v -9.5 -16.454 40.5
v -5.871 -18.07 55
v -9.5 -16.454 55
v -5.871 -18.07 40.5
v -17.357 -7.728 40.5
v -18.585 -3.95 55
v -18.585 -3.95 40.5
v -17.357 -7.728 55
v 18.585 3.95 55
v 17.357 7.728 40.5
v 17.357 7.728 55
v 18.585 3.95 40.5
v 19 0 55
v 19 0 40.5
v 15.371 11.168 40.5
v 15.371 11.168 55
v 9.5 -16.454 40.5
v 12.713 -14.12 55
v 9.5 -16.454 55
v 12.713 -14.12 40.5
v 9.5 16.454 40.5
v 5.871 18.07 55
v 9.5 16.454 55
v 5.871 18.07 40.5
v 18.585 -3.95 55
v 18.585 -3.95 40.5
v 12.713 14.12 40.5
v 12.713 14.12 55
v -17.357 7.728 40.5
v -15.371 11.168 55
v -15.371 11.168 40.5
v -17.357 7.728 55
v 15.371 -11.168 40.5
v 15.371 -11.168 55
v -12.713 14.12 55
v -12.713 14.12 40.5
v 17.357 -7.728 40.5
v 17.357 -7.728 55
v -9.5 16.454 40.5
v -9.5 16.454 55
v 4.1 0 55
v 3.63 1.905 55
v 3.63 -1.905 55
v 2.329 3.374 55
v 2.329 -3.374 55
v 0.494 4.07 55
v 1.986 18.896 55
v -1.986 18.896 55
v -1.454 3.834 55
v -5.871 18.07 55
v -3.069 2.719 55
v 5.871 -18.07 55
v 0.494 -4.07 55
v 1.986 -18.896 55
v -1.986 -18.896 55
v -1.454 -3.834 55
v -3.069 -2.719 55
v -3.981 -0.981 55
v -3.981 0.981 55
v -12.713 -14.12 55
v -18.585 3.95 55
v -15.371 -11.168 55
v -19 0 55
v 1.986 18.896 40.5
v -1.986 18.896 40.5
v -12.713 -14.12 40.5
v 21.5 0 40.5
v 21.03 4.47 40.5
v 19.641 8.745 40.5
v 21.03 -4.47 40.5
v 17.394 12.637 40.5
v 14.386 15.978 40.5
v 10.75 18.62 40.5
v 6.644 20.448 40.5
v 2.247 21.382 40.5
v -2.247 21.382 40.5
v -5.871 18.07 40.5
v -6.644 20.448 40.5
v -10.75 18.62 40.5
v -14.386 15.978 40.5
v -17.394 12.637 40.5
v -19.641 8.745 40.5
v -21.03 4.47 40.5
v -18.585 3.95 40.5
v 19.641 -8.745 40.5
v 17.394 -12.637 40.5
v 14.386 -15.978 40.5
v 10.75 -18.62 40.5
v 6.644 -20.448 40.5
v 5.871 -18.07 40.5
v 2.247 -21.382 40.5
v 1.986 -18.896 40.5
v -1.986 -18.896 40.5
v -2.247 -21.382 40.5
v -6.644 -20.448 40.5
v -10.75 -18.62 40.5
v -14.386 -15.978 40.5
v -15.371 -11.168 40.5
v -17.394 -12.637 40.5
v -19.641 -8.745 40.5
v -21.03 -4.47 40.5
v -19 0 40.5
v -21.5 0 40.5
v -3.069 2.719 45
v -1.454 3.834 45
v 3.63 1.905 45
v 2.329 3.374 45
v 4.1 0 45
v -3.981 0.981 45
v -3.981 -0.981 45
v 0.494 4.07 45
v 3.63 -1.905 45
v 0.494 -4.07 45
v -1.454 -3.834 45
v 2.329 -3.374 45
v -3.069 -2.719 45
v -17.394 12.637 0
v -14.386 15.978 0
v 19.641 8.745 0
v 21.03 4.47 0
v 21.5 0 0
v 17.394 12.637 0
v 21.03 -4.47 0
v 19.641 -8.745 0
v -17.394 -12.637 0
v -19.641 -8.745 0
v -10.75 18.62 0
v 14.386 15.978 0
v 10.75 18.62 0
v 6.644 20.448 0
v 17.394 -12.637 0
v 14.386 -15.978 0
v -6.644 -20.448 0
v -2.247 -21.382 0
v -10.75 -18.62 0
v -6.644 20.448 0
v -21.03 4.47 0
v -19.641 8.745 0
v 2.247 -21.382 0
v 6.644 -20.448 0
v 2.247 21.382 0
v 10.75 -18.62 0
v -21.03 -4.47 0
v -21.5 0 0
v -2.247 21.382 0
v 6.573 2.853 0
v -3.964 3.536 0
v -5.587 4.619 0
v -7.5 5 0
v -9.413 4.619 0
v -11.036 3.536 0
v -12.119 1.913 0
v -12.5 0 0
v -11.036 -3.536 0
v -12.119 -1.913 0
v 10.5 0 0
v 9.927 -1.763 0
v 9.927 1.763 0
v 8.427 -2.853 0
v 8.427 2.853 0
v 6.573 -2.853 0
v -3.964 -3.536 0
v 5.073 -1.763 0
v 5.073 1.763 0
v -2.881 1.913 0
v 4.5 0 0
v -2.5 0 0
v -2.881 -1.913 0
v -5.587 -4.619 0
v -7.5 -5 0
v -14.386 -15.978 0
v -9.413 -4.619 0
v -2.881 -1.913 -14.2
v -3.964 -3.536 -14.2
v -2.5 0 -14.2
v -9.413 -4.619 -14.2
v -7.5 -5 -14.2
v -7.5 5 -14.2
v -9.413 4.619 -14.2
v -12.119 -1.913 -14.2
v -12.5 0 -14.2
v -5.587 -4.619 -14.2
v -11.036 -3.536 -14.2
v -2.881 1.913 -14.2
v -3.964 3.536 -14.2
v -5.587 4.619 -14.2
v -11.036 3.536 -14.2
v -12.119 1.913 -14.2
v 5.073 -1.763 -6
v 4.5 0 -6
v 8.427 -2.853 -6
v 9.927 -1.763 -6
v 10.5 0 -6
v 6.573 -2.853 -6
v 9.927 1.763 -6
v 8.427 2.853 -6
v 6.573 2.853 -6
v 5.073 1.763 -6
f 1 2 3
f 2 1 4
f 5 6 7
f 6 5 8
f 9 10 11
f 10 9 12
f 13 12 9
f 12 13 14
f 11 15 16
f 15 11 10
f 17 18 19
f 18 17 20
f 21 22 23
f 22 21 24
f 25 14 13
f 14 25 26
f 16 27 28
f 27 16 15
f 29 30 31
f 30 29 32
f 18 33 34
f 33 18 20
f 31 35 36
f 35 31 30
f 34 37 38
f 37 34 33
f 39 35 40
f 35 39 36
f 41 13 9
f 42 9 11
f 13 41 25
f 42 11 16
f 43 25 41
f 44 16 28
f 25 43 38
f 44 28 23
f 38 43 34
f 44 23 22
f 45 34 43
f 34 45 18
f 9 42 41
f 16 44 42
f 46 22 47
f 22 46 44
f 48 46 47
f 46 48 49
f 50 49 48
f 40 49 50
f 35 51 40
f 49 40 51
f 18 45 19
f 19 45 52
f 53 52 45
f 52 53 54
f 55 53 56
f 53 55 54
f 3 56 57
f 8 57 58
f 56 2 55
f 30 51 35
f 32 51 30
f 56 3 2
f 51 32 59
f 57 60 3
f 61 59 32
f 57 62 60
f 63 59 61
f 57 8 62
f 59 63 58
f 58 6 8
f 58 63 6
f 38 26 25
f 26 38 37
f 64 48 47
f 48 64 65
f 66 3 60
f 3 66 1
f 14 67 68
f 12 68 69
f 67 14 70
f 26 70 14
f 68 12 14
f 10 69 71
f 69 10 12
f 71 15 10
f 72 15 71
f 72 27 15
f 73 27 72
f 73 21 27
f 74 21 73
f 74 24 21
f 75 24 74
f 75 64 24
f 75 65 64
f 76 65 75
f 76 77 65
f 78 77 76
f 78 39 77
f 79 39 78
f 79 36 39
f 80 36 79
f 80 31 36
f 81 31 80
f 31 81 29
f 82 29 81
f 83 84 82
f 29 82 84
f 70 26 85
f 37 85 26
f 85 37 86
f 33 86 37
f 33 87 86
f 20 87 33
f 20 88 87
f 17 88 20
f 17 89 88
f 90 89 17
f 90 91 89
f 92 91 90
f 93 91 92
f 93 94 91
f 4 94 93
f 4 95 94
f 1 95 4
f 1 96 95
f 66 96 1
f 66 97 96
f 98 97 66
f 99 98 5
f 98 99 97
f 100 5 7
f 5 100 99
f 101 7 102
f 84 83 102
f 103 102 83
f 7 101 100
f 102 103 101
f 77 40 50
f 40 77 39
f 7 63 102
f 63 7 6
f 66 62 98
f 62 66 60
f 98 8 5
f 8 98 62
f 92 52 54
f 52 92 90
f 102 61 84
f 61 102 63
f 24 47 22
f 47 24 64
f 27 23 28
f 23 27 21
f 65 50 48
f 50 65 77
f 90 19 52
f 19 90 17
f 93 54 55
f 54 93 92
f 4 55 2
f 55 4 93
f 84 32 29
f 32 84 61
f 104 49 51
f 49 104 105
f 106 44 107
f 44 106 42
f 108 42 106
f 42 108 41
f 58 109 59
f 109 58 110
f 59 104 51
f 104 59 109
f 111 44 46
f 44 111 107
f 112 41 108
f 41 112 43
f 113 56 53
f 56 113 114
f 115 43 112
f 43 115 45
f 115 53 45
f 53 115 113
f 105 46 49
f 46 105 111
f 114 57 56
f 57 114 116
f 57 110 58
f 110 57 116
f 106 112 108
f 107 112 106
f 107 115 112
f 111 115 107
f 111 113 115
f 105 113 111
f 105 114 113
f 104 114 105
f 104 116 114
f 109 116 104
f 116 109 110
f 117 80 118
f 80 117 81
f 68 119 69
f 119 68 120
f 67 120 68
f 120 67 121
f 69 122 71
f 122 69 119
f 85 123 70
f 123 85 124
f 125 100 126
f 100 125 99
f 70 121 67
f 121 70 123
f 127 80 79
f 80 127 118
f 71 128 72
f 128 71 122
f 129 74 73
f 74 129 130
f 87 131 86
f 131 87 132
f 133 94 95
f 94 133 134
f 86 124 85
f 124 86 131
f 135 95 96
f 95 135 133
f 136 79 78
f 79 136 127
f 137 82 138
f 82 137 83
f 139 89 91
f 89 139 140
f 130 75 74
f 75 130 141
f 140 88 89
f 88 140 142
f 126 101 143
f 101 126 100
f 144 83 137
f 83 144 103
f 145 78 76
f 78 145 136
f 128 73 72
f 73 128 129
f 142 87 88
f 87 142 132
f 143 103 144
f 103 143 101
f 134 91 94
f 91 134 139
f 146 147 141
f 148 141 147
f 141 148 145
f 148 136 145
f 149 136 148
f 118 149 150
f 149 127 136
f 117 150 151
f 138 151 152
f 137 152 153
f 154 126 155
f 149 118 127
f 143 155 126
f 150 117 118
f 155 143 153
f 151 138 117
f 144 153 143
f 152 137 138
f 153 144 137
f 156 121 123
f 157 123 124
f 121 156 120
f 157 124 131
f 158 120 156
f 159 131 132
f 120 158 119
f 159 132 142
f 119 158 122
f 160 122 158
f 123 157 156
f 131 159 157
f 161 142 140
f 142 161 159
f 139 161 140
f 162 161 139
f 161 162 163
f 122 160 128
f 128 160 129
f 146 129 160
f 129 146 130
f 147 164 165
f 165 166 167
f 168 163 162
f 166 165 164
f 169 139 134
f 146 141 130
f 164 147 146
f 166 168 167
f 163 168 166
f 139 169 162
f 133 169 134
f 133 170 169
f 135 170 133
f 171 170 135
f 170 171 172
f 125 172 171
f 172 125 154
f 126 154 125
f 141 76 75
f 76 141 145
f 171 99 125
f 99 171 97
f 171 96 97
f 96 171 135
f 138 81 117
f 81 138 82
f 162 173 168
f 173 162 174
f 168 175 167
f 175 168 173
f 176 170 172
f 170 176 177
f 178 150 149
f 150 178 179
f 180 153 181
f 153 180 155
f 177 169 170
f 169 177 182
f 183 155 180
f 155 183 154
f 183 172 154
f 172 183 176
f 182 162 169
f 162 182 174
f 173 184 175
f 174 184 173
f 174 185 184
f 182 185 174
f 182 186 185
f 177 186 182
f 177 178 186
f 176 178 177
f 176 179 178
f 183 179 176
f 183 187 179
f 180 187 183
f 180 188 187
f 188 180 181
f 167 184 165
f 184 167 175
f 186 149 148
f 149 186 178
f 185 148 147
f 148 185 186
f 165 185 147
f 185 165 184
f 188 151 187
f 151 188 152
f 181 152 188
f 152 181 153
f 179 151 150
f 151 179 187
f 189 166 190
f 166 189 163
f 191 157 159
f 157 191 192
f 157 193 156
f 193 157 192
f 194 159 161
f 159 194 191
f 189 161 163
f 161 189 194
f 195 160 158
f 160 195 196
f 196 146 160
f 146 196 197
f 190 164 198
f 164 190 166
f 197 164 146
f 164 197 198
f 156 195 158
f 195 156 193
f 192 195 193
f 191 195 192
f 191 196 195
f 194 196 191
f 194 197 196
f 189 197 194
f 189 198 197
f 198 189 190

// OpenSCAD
module PhotonisPMT() {
    color([1,1,1]*.2) {
        cylinder(d=43, h=55-14.5);
        difference() {
            translate([0,0,55-14.5]) cylinder(d=38, h=14.5);
            translate([0,0,55-10]) cylinder(h=11, d=8.2);
        }
    }
    color([1,1,1]*.8) translate([-15/2,0,0]) rotate(v=[1,0,0], a=180) cylinder(d=10,h=23.2-9);
    color([1,1,0]*.8) translate([+15/2,0,0]) rotate(v=[1,0,0], a=180) cylinder(d=6,h=6);
}

PhotonisPMT();
